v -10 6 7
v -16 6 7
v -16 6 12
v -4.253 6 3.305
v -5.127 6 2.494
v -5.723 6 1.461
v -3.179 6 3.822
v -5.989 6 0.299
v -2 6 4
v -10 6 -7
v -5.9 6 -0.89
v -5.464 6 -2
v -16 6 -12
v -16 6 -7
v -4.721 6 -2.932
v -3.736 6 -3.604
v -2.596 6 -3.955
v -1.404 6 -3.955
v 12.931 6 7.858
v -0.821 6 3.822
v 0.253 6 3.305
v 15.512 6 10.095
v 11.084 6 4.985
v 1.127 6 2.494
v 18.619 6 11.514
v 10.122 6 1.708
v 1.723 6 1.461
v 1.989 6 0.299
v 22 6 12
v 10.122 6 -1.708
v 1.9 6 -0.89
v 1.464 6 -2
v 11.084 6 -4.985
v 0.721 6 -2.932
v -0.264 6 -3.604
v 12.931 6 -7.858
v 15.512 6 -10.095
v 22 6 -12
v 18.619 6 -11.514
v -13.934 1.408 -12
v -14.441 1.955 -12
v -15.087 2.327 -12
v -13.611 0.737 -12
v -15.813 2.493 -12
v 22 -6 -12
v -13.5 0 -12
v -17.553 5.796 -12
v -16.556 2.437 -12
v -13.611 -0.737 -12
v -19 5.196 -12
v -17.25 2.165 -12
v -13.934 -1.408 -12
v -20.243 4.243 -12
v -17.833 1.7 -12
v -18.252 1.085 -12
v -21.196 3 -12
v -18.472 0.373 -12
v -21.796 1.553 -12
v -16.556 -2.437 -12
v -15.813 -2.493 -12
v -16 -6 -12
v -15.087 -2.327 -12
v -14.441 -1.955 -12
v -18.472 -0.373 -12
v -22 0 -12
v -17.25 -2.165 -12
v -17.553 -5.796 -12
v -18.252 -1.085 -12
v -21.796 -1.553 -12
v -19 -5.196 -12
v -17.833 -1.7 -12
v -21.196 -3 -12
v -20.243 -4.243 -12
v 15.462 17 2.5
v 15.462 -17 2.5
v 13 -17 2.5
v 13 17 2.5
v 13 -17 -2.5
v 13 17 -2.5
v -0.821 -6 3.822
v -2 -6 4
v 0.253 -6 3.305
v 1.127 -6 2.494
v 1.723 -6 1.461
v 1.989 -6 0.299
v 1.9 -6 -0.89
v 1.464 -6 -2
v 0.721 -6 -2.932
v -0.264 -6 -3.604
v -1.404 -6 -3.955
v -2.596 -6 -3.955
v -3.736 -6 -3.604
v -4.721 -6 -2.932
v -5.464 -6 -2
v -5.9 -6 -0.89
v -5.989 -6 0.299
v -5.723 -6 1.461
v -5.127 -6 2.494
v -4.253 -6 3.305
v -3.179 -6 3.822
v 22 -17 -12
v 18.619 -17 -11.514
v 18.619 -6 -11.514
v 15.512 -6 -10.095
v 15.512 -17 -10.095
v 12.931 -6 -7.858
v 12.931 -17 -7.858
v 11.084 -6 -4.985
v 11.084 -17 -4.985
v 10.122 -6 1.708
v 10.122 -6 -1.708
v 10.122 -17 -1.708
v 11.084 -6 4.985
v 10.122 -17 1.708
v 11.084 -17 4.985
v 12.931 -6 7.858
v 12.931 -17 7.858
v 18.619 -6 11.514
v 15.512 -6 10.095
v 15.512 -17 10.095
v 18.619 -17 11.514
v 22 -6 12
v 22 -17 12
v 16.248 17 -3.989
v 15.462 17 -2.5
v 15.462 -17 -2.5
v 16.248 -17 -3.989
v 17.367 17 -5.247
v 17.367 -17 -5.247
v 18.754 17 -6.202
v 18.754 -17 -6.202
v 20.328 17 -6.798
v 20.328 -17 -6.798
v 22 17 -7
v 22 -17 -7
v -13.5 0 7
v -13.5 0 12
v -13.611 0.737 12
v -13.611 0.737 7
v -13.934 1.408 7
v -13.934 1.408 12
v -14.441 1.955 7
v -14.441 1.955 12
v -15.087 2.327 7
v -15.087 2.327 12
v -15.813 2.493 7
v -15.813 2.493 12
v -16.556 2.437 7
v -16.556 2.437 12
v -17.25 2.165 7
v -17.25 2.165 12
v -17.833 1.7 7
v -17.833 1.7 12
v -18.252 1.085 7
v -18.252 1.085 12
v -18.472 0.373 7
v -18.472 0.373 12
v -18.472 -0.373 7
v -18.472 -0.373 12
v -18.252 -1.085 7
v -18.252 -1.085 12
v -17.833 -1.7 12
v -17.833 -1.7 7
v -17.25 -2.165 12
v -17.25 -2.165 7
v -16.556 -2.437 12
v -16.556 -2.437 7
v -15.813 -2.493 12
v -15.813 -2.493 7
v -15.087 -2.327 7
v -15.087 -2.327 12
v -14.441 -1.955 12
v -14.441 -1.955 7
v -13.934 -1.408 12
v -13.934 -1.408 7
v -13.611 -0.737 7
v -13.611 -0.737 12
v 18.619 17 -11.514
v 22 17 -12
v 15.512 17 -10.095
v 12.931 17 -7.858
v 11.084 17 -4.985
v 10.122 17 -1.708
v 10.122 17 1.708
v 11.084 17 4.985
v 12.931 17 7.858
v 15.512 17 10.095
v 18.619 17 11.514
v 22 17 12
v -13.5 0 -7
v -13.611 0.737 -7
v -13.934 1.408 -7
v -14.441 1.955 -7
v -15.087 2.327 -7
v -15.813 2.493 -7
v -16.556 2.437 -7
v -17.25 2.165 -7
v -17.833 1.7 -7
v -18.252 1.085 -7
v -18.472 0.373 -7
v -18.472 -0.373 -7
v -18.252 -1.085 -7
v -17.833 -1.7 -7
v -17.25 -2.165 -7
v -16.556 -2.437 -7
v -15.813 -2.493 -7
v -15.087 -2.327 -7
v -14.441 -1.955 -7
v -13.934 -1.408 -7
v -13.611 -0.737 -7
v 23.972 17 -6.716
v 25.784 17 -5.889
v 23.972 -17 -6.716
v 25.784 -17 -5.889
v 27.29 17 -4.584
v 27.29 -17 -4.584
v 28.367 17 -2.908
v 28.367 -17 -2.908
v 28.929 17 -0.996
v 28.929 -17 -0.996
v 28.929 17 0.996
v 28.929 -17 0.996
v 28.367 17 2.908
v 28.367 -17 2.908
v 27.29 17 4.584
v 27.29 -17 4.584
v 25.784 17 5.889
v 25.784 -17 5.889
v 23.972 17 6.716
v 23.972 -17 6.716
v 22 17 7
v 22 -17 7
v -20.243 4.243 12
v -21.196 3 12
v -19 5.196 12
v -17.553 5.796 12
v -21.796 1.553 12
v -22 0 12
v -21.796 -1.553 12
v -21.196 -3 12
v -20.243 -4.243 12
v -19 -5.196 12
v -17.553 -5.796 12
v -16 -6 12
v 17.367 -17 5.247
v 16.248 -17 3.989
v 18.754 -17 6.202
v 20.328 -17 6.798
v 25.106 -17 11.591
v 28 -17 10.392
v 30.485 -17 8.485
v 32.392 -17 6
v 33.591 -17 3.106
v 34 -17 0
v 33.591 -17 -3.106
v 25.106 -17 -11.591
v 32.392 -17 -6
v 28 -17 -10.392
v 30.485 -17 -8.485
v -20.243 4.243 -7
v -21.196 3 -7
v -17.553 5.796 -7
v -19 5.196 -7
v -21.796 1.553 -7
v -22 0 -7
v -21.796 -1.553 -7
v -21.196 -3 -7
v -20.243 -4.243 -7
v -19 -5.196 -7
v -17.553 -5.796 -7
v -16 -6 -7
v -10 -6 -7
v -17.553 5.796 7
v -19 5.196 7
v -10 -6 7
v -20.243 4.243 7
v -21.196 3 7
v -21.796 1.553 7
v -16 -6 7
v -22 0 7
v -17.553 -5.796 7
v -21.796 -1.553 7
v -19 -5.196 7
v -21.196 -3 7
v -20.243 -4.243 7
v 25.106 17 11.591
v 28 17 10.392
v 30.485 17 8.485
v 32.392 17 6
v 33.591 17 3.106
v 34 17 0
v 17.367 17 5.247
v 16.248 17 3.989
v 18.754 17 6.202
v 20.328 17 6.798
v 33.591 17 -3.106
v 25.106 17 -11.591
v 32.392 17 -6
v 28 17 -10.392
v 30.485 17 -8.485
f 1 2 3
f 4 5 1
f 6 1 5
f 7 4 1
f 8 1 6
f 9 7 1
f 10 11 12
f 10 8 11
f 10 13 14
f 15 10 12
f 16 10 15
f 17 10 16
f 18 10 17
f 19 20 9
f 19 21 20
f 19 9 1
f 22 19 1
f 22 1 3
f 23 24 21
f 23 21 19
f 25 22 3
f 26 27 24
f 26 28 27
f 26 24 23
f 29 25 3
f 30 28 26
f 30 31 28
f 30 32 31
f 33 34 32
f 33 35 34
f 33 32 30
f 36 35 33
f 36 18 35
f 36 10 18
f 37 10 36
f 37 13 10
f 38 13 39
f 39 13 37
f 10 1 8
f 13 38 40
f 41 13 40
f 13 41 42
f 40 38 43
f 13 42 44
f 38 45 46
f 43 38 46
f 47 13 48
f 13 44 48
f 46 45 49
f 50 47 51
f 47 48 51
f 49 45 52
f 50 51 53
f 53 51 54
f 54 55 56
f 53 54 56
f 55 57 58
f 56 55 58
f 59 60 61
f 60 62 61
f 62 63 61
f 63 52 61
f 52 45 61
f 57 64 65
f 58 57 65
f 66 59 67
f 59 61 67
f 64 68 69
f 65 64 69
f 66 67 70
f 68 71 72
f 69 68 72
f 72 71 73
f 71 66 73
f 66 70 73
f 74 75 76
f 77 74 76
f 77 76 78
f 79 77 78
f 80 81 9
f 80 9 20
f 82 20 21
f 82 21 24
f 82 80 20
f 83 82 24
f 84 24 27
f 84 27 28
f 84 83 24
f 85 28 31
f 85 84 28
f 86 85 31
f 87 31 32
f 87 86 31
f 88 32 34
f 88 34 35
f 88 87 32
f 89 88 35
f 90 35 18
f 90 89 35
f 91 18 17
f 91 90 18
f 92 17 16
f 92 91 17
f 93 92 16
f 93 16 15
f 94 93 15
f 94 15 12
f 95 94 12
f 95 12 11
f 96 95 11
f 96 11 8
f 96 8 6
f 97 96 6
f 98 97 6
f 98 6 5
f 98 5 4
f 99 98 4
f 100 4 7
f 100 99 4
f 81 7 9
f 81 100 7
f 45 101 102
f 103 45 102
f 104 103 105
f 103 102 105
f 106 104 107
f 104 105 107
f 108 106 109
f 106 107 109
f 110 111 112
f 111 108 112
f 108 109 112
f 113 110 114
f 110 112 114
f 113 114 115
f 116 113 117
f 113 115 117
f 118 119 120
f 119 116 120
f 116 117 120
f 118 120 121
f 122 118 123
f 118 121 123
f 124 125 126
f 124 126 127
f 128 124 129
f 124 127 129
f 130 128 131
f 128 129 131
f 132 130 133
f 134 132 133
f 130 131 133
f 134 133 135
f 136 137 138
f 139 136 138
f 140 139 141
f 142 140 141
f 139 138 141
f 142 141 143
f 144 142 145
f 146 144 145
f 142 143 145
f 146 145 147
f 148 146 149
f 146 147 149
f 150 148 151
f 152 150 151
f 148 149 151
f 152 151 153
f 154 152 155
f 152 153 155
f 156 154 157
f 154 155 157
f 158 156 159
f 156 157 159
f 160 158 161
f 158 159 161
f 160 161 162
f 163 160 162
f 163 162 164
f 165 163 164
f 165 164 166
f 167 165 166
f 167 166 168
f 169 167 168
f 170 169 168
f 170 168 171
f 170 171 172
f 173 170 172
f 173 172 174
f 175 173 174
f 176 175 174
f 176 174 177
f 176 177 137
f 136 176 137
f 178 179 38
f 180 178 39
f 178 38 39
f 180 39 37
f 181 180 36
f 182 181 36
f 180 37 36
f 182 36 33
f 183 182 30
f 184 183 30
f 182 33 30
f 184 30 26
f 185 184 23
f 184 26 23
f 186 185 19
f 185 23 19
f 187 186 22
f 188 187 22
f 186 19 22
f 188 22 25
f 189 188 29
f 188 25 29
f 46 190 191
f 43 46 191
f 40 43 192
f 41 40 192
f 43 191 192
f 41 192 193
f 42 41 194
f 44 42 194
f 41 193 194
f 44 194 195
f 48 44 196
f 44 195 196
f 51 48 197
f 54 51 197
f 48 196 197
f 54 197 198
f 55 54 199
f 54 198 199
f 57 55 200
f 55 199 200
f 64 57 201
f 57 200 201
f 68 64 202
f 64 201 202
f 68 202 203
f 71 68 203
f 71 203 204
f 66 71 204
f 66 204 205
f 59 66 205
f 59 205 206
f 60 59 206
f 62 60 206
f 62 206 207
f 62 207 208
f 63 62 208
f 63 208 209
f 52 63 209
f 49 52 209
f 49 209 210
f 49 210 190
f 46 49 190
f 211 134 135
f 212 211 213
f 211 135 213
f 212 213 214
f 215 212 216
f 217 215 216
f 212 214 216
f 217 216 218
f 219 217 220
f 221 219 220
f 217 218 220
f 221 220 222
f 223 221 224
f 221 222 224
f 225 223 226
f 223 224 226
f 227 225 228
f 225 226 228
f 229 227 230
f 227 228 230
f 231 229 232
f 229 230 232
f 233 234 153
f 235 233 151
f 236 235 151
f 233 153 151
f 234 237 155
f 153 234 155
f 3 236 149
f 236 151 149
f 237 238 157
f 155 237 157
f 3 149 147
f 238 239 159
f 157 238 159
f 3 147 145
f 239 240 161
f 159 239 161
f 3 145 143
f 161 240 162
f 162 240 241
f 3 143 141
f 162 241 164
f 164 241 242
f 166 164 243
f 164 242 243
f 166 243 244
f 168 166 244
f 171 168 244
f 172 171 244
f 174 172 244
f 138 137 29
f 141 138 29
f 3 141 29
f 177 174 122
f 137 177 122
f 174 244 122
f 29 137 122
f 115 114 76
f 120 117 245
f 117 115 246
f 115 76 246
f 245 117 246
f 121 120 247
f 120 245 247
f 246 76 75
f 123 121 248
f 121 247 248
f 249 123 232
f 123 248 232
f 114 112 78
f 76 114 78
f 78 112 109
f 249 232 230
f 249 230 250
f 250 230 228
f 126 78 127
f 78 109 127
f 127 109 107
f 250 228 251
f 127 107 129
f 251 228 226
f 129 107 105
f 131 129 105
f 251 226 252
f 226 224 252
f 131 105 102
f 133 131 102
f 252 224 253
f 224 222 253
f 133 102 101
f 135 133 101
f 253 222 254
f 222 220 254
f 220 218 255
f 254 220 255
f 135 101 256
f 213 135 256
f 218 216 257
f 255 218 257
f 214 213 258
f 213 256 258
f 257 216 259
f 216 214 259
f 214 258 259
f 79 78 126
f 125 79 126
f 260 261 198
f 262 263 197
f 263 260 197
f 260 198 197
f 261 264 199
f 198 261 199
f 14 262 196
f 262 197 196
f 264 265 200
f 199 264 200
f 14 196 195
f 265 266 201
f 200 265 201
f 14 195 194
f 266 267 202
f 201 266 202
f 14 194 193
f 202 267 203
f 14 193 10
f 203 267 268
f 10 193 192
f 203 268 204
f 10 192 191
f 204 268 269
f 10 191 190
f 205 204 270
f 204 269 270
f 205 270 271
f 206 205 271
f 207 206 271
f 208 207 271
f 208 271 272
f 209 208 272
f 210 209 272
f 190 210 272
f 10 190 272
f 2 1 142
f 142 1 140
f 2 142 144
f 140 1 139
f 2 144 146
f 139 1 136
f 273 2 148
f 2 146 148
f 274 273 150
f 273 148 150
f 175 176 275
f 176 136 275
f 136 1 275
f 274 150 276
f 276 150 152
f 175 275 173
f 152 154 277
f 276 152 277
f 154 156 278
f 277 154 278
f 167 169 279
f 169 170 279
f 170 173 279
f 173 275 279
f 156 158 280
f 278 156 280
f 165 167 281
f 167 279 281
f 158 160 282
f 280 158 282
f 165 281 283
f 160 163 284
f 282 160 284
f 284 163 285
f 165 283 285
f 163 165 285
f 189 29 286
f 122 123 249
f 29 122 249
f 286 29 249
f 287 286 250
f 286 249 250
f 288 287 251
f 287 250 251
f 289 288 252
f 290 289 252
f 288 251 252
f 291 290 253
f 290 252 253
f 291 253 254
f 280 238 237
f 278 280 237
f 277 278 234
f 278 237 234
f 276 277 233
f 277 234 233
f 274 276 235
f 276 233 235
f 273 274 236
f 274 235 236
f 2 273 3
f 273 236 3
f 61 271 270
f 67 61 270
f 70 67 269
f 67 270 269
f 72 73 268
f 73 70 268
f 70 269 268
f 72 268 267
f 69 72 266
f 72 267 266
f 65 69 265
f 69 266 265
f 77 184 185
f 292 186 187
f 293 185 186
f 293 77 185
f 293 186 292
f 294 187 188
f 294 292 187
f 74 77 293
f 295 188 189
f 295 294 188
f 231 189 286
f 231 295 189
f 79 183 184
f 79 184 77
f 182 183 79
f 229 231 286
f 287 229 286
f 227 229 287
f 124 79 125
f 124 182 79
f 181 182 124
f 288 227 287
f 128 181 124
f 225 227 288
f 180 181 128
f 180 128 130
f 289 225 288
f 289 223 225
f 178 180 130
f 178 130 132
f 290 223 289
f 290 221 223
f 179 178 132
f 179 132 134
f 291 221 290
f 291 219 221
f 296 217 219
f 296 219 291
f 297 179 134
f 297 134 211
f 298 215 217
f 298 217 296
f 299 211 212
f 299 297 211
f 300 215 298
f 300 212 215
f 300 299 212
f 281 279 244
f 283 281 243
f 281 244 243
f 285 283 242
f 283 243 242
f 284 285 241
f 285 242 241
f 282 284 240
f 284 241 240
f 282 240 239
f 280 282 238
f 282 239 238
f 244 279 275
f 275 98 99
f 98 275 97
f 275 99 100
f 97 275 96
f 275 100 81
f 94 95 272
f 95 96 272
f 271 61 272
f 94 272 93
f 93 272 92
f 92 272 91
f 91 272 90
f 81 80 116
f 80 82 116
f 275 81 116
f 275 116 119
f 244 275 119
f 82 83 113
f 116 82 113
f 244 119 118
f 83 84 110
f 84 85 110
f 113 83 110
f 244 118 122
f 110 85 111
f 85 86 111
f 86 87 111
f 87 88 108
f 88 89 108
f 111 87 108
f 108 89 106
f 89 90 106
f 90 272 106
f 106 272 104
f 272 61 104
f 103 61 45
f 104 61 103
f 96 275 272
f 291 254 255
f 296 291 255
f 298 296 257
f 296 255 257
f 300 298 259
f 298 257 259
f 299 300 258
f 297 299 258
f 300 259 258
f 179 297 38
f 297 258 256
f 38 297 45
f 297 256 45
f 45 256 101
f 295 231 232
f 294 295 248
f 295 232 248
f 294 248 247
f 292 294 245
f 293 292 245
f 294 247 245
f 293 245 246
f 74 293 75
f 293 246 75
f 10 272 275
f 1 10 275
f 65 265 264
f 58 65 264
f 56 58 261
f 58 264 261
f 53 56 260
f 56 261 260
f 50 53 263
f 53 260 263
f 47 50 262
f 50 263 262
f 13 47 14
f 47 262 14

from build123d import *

# Parameters (mm, degrees)
BOSS_EXTRUDE1_DEPTH      = 17
BOSS_EXTRUDE1_DEPTH_BACK = 17
SKETCH1_R                = 12
BOSS_EXTRUDE2_DEPTH      = 6
BOSS_EXTRUDE2_DEPTH_BACK = 6
SKETCH1_3_R              = 4
SKETCH2_R                = 2.5
CUT_EXTRUDE1_DEPTH       = 45.955533586


with BuildPart() as part:
    # Sketch1 → Boss-Extrude1 (new, two sides: drawn at the far end of the back side and taken through both)
    with BuildSketch(Plane(origin=(0, 0, 0), x_dir=(1, 0, 0), z_dir=(0, 1, 0)).offset(-BOSS_EXTRUDE1_DEPTH_BACK)):
        with Locations((22, 0)):
            Circle(SKETCH1_R)
        with BuildLine():
            ThreePointArc((15.461651585, 2.5), (29, 0), (15.461651585, -2.5))
            Line((15.461651585, -2.5), (13, -2.5))
            Line((13, -2.5), (13, 2.5))
            Line((13, 2.5), (15.461651585, 2.5))
        make_face(mode=Mode.SUBTRACT)
    extrude(amount=BOSS_EXTRUDE1_DEPTH + BOSS_EXTRUDE1_DEPTH_BACK)

    # Sketch1<3> → Boss-Extrude2 (add, two sides: drawn at the far end of the back side and taken through both)
    with BuildSketch(Plane(origin=(0, 0, 0), x_dir=(1, 0, 0), z_dir=(0, 1, 0)).offset(-BOSS_EXTRUDE2_DEPTH_BACK)):
        with BuildLine():
            Line((-22, -7), (-22, -12))
            Line((-22, -12), (22, -12))
            ThreePointArc((22, -12), (10, 0), (22, 12))
            Line((22, 12), (-22, 12))
            Line((-22, 12), (-22, 7))
            Line((-22, 7), (-10, 7))
            Line((-10, 7), (-10, -7))
            Line((-10, -7), (-22, -7))
        make_face()
        with Locations((-2, 0)):
            Circle(SKETCH1_3_R, mode=Mode.SUBTRACT)
    extrude(amount=BOSS_EXTRUDE2_DEPTH + BOSS_EXTRUDE2_DEPTH_BACK)

    # Sketch2 → Cut-Extrude1 (cut, through all)
    with BuildSketch(Plane.XY.offset(12)):
        with BuildLine():
            Line((-16, 6), (-22, 6))
            Line((-22, 6), (-22, -5e-09))
            ThreePointArc((-22, -5e-09), (-20.242640689, 4.242640685), (-16, 6))
        make_face()
        with BuildLine():
            ThreePointArc((-16, -6), (-20.242640685, -4.242640689), (-22, -5e-09))
            Line((-22, -5e-09), (-22, -6))
            Line((-22, -6), (-16, -6))
        make_face()
        with Locations((-16, 0)):
            Circle(SKETCH2_R)
    extrude(amount=-CUT_EXTRUDE1_DEPTH, mode=Mode.SUBTRACT)


solid = part.part
